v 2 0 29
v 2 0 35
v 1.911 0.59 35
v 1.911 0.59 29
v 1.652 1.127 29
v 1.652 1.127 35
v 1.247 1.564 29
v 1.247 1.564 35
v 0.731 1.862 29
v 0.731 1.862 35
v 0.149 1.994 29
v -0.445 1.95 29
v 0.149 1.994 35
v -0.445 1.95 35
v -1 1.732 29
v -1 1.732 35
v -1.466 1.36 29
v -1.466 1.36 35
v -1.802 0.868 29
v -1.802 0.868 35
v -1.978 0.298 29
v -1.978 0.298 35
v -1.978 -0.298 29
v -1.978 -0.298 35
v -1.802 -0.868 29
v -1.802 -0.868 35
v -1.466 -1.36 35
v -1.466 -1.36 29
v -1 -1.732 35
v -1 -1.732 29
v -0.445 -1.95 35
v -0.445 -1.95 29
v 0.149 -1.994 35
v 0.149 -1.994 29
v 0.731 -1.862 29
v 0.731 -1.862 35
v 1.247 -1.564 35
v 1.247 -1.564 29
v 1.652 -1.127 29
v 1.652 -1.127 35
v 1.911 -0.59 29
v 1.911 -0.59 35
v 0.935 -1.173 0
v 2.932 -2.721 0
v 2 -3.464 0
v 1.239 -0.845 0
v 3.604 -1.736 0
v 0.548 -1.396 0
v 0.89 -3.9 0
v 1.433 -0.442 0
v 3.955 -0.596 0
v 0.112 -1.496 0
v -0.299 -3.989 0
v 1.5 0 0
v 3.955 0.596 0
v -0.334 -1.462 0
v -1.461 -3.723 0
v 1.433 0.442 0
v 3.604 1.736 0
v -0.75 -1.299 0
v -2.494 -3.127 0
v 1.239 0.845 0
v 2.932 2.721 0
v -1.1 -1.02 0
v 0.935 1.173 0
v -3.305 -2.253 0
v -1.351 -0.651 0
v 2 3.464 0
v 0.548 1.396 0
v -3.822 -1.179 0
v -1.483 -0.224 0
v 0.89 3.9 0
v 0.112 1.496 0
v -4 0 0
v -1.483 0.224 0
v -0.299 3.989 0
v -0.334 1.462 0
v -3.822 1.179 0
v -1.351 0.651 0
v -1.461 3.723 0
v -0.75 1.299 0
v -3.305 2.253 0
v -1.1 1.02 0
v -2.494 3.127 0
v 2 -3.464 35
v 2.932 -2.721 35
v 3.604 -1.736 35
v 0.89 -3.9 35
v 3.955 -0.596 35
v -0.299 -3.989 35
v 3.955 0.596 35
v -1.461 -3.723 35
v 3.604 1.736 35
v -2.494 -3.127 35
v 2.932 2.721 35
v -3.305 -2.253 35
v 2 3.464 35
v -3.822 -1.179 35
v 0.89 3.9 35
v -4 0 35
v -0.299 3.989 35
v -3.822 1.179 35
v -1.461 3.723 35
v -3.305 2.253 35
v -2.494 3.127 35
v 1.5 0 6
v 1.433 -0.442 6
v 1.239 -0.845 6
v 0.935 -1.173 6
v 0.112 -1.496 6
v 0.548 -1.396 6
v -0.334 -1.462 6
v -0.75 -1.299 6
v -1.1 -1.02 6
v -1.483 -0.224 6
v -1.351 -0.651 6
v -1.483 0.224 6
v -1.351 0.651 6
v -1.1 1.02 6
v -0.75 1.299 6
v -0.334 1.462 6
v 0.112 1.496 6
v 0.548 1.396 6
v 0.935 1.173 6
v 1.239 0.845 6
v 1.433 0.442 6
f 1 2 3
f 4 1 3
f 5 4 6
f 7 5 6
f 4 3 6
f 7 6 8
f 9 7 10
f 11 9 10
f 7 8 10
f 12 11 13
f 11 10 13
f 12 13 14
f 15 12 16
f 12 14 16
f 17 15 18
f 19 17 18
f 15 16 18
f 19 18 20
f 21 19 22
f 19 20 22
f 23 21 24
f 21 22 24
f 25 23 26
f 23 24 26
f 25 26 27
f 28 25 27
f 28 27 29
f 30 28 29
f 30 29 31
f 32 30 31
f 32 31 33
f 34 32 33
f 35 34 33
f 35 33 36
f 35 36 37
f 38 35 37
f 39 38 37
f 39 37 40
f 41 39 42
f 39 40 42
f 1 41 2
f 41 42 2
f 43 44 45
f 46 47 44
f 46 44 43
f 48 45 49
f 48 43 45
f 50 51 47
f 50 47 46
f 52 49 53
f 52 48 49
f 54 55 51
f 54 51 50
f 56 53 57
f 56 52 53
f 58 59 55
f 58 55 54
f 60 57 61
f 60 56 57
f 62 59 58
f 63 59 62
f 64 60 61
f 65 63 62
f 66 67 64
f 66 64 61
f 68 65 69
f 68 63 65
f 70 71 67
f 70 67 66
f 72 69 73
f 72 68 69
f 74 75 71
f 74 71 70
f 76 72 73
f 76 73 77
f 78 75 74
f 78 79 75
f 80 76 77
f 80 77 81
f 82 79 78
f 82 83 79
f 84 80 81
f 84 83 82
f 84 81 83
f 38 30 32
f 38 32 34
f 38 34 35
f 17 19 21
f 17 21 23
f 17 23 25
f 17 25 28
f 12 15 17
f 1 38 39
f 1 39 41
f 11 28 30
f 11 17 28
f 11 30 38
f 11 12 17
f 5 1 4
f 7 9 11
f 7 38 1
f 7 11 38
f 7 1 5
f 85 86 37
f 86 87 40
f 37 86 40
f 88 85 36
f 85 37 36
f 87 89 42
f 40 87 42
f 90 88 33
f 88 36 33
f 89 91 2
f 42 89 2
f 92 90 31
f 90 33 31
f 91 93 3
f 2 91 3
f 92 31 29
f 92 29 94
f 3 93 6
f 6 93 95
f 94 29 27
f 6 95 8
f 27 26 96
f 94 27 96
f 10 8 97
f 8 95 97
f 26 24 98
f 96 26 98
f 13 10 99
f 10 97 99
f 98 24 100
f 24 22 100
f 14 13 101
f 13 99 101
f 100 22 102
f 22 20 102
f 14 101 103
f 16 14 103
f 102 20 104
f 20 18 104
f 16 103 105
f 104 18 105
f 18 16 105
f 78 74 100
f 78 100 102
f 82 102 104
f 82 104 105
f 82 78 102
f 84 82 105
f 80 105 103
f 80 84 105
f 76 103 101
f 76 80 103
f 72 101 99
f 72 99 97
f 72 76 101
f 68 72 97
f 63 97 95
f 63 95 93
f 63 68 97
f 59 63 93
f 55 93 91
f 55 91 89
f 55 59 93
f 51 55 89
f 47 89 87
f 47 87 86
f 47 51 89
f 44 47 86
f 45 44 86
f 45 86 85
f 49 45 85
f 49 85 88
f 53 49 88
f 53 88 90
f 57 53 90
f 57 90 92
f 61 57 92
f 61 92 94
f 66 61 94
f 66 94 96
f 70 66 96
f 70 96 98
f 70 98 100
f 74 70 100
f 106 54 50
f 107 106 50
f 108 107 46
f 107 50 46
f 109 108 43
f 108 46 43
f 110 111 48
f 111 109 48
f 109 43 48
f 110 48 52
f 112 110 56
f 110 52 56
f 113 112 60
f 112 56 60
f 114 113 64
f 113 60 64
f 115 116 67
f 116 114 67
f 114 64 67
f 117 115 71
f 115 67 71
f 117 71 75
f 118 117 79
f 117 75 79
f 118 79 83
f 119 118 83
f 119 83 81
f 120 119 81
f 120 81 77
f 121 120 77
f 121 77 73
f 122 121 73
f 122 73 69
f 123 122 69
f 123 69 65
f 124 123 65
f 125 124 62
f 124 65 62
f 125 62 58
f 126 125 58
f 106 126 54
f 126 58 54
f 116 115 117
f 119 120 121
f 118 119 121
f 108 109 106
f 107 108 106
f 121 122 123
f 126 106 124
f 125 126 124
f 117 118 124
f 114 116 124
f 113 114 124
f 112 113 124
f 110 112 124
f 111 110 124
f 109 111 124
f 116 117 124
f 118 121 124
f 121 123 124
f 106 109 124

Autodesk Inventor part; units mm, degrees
ref_plane "YZ Plane" through (0, 0, 0) normal (1, 0, 0) x (0, 1, 0)
ref_plane "XZ Plane" through (0, 0, 0) normal (0, 1, 0) x (-1, 0, 0)
sketch "スケッチ1" plane through (0, 0, 0) normal (0, 0, 1) x (1, 0, 0)
  circle A0 centre (0, 0) radius 1.5
  circle A1 centre (0, 0) radius 3
  dimension "d0" = 3
  dimension "d1" = 6
extrude "押し出し1" add sketch "スケッチ1" along normal blind 35
ref_plane "作業平面1" through (0, 0, 29) normal (0, 0, 1) x (1, 0, 0)
sketch "スケッチ3" plane through (0, 0, 29) normal (0, 0, 1) x (1, 0, 0)
  circle A0 centre (0, 0) radius 1.5 projected
extrude "押し出し3" add sketch "スケッチ3" against normal blind 23
sketch "スケッチ4" plane through (0, 0, 0) normal (0, 0, -1) x (-1, 0, 0)
  circle A0 centre (0, 0) radius 3 projected
  circle A1 centre (0, 0) radius 1.5 projected
  circle A2 centre (0, 0) radius 3 projected
  circle A3 centre (0, 0) radius 4
  dimension "d9" = 8
extrude "押し出し4" add sketch "スケッチ4" against normal blind 35 contours A3
sketch "スケッチ5" plane through (0, 0, 35) normal (0, 0, 1) x (1, 0, 0)
  circle A0 centre (0, 0) radius 1.5 projected
  circle A1 centre (0, 0) radius 2
  dimension "d12" = 4
extrude "押し出し5" cut sketch "スケッチ5" against normal blind 6 contours A0 | A1
properties part number "スペーサー自作m3,35" material "アルミニウム 7075"
